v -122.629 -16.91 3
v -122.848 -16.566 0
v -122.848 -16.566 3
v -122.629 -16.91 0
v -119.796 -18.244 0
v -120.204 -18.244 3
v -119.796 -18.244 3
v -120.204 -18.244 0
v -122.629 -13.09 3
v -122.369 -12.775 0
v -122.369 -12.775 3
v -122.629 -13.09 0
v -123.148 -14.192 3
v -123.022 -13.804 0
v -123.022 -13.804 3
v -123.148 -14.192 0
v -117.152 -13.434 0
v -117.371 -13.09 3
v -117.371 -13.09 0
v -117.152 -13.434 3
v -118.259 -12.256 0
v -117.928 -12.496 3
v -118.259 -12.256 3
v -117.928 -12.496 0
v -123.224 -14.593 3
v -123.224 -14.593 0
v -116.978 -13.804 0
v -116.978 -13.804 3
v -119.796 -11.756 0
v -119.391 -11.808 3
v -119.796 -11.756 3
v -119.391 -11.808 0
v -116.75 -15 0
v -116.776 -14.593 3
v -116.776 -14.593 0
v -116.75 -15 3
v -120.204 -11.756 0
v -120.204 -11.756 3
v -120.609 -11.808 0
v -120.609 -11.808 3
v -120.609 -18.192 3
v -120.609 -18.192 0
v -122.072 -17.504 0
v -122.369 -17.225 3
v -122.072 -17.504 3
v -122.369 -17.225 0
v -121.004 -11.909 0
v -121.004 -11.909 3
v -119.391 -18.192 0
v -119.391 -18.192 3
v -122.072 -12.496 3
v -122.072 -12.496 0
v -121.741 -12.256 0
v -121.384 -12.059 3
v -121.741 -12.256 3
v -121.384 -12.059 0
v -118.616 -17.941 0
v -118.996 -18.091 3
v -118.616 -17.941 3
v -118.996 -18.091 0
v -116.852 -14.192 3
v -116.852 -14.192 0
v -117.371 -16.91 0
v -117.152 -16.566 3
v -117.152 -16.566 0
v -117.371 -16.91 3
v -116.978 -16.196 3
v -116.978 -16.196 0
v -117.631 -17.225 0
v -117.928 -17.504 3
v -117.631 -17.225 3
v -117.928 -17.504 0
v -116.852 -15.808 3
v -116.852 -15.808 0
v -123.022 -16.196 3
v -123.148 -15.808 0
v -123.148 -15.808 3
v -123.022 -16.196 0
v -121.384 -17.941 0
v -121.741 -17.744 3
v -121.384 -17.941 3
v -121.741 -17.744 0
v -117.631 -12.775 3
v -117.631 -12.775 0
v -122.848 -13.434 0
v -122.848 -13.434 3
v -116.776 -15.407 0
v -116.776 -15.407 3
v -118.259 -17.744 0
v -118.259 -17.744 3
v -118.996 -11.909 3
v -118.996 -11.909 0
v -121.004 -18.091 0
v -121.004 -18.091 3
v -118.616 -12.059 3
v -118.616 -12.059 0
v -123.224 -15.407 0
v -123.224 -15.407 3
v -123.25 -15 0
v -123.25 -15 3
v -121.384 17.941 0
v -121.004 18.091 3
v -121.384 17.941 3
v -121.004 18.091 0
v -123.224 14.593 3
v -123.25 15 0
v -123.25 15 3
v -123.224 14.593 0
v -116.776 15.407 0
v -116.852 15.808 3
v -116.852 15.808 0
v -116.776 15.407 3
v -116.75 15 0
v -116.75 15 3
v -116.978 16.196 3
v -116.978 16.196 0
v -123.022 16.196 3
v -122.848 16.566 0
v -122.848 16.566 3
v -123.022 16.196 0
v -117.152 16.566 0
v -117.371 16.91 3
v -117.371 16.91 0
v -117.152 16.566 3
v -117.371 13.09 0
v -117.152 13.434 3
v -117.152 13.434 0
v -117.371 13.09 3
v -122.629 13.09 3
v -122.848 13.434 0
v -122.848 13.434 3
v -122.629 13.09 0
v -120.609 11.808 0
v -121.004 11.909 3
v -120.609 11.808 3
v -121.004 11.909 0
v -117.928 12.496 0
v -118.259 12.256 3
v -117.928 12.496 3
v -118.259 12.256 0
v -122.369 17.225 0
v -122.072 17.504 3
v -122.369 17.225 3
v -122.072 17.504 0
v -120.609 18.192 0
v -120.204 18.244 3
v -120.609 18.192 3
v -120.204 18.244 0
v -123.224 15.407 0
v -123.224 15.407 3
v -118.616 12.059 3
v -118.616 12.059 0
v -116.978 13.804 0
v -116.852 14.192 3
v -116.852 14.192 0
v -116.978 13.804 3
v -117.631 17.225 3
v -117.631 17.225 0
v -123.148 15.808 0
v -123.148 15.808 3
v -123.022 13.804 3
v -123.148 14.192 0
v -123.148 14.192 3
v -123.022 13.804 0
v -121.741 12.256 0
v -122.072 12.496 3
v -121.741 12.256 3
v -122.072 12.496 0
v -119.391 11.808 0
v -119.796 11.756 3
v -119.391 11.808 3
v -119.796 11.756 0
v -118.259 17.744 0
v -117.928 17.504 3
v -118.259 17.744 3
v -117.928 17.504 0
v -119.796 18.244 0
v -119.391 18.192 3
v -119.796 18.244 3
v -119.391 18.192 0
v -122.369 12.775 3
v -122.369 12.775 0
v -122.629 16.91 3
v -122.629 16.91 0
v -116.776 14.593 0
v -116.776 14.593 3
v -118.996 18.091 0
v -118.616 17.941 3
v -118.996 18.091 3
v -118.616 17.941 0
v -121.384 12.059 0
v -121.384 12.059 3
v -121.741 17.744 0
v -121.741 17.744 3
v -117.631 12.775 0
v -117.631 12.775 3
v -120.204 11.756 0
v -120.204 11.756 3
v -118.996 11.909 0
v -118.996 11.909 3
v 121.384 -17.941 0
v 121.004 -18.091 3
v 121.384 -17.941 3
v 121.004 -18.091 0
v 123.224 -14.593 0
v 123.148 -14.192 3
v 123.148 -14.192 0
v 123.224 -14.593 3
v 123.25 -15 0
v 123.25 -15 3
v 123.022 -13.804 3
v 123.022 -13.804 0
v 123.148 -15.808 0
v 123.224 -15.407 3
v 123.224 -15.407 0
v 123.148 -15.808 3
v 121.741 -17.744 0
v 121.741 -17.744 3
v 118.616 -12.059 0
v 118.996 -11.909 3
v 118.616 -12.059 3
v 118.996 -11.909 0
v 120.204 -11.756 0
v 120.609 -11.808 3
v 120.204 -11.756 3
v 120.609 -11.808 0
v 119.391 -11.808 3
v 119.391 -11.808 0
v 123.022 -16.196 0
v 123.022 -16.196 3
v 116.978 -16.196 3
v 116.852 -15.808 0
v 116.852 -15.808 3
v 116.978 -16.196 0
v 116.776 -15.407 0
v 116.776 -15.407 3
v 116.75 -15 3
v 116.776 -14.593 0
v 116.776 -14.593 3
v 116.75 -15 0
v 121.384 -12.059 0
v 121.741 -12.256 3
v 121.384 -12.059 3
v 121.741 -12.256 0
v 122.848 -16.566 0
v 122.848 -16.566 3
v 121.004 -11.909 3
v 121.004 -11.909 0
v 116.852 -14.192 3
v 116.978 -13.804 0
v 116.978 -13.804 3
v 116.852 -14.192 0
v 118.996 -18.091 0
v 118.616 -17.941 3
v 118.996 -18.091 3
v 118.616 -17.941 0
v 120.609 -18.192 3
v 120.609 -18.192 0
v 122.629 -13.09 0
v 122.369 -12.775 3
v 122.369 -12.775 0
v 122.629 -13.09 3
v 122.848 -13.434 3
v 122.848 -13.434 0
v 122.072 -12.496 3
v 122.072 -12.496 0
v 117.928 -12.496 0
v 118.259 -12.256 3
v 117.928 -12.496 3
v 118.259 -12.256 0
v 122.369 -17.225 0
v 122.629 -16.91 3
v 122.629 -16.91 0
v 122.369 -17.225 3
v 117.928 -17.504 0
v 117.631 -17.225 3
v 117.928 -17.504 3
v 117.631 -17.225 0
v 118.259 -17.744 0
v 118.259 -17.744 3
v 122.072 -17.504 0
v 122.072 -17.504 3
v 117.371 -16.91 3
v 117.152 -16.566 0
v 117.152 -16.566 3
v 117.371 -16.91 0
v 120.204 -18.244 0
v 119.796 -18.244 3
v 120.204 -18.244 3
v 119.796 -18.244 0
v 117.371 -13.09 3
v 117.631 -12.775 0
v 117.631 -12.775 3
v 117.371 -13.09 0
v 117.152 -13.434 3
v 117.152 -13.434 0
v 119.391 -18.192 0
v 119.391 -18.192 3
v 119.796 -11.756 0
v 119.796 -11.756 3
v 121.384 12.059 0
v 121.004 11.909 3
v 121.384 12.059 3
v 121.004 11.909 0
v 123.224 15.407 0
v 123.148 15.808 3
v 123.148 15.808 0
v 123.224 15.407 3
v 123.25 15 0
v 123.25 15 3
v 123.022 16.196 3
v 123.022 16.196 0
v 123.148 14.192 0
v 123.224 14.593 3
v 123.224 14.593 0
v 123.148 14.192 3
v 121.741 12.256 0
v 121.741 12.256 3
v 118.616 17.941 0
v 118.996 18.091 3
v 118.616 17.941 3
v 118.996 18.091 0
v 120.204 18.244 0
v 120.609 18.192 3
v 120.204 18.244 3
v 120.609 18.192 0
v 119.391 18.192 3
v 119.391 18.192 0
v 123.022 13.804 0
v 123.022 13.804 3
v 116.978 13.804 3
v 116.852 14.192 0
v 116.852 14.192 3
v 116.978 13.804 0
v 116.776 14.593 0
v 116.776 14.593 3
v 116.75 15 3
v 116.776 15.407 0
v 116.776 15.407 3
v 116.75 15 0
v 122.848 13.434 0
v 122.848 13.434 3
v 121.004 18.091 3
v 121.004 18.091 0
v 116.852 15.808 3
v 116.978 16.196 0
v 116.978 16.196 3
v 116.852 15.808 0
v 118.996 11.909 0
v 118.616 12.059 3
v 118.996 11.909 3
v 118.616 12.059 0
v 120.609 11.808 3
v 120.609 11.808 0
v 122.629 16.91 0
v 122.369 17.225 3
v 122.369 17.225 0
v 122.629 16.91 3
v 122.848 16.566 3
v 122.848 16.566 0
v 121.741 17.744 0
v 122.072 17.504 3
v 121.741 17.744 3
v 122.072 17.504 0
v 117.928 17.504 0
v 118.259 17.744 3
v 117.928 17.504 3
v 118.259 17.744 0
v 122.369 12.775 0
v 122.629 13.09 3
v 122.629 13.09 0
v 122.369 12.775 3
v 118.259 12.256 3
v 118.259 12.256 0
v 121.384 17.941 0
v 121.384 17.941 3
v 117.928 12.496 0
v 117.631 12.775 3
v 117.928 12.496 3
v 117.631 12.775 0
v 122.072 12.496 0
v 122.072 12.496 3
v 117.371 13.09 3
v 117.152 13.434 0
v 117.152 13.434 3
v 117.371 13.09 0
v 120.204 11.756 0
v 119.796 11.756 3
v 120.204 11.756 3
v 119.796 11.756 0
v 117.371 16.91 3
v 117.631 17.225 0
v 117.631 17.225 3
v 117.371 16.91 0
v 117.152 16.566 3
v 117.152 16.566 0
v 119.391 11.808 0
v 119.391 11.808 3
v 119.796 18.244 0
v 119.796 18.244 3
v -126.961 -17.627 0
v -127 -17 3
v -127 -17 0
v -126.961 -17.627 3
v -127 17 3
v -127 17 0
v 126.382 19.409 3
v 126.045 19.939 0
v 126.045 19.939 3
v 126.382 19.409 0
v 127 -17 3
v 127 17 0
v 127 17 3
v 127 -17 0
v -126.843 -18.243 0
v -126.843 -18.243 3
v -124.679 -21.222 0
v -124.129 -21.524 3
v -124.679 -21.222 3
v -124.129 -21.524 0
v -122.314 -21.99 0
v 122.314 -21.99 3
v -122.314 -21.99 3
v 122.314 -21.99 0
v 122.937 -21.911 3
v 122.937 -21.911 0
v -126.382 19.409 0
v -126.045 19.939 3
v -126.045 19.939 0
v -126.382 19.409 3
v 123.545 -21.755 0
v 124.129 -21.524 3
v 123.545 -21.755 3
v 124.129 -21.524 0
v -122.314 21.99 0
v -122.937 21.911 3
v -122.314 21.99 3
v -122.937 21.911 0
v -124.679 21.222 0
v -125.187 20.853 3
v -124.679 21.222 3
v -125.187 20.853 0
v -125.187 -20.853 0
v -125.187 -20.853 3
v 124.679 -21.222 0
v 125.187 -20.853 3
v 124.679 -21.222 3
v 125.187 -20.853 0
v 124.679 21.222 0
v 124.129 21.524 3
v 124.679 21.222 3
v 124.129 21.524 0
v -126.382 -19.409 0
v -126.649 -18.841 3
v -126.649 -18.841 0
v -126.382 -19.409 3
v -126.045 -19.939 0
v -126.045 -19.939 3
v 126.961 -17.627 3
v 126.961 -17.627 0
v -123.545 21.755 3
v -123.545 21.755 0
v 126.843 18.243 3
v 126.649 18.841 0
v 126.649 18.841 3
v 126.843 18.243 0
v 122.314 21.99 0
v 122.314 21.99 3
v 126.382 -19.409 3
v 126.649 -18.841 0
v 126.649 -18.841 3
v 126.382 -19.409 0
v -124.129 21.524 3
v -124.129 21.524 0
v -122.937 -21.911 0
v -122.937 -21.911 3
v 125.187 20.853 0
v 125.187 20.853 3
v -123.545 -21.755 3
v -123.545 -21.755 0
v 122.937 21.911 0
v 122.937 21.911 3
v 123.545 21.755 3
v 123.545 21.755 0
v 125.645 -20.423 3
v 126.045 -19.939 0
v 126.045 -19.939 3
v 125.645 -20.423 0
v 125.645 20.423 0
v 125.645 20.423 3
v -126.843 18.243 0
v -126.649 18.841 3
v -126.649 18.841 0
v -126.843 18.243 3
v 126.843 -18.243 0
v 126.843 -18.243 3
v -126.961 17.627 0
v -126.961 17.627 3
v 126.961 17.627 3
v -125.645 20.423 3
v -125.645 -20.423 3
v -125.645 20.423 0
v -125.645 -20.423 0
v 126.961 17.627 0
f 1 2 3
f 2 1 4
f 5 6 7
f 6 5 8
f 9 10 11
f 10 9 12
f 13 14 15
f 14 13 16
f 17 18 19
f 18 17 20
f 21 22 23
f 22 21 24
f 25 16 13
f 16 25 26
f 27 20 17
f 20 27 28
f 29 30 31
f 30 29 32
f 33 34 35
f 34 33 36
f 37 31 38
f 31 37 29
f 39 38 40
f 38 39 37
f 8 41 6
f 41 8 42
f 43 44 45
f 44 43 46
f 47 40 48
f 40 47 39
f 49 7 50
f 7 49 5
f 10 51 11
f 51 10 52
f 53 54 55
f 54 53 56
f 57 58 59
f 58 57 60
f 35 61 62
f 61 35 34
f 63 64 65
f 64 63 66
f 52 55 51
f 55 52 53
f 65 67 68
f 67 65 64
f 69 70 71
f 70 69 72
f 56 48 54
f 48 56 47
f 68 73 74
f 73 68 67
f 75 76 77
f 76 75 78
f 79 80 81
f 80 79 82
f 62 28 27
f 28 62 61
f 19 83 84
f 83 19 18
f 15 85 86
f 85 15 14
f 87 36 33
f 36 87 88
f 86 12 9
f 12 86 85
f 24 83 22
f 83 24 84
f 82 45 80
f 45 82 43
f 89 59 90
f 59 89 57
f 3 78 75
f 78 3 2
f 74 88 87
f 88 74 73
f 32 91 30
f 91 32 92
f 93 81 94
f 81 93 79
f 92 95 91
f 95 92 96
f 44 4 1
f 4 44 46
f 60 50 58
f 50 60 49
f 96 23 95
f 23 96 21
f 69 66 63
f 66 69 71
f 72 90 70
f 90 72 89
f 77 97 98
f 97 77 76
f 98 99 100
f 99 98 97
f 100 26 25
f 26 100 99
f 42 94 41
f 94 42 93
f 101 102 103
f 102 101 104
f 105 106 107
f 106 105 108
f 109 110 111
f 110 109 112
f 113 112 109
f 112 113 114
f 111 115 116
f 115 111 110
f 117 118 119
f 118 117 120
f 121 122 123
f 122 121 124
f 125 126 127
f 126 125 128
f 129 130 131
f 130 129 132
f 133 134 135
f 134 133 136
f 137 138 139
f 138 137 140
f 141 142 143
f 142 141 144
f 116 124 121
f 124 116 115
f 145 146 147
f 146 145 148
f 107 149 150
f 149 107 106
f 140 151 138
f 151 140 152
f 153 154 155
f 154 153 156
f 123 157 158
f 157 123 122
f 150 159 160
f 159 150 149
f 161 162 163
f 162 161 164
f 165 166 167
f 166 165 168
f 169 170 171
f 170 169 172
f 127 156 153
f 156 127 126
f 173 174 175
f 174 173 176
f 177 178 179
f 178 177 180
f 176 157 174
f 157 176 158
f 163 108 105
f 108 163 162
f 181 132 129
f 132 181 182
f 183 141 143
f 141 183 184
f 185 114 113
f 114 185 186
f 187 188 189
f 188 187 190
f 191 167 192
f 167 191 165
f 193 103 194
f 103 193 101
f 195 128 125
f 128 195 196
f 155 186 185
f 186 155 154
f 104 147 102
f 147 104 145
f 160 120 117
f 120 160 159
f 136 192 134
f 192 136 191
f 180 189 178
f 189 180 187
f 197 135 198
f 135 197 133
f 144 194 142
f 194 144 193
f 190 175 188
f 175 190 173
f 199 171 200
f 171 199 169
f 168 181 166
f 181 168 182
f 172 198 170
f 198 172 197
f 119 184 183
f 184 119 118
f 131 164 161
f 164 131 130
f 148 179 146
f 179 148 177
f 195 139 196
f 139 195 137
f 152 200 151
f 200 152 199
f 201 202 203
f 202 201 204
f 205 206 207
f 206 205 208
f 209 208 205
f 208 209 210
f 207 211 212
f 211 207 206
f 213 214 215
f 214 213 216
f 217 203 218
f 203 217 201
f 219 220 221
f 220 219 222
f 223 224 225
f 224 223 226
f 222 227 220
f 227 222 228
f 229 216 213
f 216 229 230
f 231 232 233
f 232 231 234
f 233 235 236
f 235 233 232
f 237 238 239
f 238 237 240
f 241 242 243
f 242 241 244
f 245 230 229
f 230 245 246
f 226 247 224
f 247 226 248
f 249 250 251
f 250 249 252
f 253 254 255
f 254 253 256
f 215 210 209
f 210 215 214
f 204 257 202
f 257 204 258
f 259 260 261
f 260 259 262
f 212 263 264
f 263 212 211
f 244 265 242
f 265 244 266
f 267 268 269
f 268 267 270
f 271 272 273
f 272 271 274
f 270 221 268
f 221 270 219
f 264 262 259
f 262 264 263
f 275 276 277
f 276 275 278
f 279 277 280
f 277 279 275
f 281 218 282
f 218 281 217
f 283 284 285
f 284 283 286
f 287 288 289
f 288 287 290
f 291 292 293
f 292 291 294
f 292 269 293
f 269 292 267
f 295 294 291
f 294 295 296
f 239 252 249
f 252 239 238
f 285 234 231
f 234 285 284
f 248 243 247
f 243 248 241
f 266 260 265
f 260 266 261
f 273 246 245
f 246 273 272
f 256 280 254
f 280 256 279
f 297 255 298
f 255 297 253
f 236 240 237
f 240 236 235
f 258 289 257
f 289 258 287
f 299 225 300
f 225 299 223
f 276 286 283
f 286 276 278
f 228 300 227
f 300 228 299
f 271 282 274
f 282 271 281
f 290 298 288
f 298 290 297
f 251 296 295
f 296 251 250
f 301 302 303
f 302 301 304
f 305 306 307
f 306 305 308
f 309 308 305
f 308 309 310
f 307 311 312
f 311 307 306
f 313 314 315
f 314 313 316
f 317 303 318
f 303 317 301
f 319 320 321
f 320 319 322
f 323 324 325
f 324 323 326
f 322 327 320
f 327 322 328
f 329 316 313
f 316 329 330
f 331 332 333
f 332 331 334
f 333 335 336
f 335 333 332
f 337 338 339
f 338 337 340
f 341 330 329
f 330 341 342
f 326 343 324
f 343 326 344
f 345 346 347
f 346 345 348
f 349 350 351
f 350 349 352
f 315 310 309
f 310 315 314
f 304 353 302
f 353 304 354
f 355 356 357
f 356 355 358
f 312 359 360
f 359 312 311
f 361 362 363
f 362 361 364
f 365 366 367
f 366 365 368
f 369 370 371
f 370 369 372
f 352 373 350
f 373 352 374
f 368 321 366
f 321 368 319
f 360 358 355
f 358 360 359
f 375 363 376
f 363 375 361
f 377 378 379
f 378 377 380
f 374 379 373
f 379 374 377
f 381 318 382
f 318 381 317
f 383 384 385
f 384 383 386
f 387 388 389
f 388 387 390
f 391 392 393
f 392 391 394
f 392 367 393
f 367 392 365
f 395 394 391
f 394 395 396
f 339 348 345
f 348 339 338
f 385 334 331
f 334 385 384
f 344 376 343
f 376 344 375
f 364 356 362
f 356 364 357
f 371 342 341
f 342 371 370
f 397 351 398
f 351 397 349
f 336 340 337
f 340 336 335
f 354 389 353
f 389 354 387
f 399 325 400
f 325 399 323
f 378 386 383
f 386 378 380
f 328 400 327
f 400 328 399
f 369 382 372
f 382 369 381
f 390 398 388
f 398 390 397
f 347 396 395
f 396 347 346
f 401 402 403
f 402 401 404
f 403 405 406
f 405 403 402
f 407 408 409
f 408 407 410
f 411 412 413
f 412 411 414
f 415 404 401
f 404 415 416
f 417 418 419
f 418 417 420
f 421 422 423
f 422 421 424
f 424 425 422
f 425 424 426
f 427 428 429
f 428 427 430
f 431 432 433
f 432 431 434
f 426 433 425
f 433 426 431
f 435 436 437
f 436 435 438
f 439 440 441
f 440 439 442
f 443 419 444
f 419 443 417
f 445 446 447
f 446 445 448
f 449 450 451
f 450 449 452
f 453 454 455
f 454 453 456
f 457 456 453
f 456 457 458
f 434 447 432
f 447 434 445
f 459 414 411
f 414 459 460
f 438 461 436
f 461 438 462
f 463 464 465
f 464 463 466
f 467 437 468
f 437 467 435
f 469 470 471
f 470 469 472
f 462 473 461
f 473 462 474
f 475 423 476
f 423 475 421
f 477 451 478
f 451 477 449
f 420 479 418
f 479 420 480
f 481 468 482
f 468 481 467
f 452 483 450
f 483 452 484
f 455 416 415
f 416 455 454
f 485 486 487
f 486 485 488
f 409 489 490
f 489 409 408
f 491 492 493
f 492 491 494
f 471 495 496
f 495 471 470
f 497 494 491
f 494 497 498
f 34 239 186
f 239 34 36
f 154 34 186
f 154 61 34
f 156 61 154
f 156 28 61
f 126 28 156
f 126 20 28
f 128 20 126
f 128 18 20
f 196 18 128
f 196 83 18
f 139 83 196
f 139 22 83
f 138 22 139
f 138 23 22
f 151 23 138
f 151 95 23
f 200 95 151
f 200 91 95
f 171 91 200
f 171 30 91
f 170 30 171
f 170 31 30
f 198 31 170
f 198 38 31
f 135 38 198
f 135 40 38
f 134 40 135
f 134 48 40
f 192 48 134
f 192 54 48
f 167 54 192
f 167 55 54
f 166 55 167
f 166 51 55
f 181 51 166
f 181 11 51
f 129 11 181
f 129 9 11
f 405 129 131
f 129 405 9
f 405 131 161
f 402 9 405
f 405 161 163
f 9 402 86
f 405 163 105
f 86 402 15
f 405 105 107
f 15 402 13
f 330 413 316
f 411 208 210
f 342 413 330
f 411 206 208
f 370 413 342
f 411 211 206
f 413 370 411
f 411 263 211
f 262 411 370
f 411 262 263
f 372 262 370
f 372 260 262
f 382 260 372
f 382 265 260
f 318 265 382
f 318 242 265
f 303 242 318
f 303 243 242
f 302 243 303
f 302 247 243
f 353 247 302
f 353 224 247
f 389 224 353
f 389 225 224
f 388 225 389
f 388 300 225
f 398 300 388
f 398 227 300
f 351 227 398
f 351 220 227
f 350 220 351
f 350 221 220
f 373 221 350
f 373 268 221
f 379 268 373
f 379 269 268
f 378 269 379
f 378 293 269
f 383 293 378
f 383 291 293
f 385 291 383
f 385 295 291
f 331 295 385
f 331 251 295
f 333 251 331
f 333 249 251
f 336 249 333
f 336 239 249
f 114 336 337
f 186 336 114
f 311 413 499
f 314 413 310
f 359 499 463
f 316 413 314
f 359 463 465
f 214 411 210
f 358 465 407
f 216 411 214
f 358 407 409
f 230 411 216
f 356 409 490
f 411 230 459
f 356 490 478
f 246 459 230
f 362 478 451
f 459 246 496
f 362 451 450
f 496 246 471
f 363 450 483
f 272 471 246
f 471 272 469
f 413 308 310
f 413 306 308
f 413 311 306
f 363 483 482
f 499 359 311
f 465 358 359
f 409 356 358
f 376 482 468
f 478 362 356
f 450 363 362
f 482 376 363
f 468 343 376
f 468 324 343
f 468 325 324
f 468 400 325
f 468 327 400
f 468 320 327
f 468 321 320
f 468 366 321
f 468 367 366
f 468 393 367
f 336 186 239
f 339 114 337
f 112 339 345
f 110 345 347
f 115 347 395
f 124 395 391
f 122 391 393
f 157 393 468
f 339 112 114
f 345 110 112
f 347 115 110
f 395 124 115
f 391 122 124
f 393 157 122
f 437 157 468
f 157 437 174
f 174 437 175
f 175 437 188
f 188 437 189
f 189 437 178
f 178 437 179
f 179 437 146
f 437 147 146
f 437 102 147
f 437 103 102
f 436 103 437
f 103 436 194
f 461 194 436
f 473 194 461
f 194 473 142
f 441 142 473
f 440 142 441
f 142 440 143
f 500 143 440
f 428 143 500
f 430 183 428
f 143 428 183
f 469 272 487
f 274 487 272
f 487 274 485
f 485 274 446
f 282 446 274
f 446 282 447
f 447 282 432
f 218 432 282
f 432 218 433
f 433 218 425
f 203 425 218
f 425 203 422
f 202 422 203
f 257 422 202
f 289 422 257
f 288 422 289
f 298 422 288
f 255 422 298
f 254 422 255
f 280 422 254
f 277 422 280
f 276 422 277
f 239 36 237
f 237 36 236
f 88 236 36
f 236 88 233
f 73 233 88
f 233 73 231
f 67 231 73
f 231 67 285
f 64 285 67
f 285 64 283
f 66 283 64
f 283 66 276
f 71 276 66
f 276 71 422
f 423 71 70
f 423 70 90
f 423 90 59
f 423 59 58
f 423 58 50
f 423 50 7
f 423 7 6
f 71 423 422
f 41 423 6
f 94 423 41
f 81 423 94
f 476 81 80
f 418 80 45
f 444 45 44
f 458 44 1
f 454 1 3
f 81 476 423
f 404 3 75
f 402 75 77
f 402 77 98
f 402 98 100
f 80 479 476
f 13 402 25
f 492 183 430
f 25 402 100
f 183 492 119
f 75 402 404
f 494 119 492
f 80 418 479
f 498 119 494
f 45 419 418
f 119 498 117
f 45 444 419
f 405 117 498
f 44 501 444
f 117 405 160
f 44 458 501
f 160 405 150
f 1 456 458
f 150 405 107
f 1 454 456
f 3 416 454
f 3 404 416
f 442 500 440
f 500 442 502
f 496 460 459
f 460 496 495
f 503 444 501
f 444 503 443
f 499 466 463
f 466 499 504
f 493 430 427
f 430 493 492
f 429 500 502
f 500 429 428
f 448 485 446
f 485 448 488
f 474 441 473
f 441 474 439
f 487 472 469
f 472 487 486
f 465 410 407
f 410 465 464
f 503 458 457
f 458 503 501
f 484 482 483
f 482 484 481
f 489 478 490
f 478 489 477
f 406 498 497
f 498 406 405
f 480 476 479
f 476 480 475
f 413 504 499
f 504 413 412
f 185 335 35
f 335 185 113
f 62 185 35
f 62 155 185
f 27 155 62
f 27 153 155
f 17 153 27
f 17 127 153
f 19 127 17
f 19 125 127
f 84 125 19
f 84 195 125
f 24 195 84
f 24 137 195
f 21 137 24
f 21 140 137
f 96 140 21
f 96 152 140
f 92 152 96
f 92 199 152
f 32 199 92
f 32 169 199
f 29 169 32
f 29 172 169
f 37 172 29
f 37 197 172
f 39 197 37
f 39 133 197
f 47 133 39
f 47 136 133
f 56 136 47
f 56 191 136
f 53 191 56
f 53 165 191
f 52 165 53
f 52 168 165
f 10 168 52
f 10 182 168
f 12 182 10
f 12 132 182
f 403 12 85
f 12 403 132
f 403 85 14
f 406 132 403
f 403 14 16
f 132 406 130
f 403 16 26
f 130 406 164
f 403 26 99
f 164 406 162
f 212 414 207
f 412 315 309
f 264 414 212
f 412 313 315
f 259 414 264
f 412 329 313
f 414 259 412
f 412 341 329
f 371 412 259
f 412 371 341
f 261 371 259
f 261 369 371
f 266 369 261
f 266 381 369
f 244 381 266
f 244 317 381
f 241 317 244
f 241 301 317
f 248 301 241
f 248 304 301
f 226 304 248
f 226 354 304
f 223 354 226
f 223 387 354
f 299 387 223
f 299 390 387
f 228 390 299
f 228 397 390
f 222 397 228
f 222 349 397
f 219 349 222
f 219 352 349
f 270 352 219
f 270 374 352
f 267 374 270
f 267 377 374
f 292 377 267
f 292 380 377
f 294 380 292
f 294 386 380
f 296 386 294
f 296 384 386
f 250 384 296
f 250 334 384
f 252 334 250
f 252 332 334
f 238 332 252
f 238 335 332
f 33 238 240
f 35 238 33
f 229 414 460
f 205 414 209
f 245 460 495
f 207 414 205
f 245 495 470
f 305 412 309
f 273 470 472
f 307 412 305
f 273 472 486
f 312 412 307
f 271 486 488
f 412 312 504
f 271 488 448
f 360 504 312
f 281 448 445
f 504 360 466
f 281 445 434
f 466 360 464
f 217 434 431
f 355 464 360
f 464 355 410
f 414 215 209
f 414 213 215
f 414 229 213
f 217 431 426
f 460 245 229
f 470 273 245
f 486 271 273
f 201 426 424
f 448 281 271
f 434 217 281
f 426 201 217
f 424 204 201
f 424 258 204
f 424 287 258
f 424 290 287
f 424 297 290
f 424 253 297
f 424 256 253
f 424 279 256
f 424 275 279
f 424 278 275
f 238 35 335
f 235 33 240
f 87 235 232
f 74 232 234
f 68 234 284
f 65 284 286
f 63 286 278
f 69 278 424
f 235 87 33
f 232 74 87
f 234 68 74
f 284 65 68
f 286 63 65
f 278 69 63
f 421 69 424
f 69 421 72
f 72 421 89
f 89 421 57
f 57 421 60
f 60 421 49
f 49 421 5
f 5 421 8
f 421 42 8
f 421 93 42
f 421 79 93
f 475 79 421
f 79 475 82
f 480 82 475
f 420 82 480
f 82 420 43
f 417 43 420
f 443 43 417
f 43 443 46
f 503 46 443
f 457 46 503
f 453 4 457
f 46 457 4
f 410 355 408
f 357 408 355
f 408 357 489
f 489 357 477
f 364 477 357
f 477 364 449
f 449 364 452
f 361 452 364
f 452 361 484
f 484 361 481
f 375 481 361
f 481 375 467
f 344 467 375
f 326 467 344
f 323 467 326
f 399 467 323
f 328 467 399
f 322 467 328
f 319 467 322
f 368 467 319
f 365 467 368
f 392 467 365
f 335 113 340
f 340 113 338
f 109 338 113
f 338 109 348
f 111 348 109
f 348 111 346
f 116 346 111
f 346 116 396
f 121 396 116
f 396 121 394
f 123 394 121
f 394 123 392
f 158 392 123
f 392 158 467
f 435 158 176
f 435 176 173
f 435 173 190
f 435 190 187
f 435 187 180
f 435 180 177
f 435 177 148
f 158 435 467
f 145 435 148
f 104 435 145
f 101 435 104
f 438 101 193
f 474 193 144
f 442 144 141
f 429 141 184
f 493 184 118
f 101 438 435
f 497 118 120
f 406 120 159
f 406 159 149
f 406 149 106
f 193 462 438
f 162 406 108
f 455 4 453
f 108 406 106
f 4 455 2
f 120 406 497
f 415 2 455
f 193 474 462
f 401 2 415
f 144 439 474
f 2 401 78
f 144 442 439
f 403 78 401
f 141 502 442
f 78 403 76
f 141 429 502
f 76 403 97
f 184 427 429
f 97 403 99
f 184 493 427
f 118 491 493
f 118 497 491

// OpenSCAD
$fn = 50;


difference() {
	union() {
		hull() {
			translate(v = [-122.0000000000, 17.0000000000, 0]) {
				cylinder(h = 3, r = 5);
			}
			translate(v = [122.0000000000, 17.0000000000, 0]) {
				cylinder(h = 3, r = 5);
			}
			translate(v = [-122.0000000000, -17.0000000000, 0]) {
				cylinder(h = 3, r = 5);
			}
			translate(v = [122.0000000000, -17.0000000000, 0]) {
				cylinder(h = 3, r = 5);
			}
		}
	}
	union() {
		translate(v = [-120.0000000000, -15.0000000000, -100.0000000000]) {
			cylinder(h = 200, r = 3.2500000000);
		}
		translate(v = [-120.0000000000, 15.0000000000, -100.0000000000]) {
			cylinder(h = 200, r = 3.2500000000);
		}
		translate(v = [120.0000000000, -15.0000000000, -100.0000000000]) {
			cylinder(h = 200, r = 3.2500000000);
		}
		translate(v = [120.0000000000, 15.0000000000, -100.0000000000]) {
			cylinder(h = 200, r = 3.2500000000);
		}
	}
}
